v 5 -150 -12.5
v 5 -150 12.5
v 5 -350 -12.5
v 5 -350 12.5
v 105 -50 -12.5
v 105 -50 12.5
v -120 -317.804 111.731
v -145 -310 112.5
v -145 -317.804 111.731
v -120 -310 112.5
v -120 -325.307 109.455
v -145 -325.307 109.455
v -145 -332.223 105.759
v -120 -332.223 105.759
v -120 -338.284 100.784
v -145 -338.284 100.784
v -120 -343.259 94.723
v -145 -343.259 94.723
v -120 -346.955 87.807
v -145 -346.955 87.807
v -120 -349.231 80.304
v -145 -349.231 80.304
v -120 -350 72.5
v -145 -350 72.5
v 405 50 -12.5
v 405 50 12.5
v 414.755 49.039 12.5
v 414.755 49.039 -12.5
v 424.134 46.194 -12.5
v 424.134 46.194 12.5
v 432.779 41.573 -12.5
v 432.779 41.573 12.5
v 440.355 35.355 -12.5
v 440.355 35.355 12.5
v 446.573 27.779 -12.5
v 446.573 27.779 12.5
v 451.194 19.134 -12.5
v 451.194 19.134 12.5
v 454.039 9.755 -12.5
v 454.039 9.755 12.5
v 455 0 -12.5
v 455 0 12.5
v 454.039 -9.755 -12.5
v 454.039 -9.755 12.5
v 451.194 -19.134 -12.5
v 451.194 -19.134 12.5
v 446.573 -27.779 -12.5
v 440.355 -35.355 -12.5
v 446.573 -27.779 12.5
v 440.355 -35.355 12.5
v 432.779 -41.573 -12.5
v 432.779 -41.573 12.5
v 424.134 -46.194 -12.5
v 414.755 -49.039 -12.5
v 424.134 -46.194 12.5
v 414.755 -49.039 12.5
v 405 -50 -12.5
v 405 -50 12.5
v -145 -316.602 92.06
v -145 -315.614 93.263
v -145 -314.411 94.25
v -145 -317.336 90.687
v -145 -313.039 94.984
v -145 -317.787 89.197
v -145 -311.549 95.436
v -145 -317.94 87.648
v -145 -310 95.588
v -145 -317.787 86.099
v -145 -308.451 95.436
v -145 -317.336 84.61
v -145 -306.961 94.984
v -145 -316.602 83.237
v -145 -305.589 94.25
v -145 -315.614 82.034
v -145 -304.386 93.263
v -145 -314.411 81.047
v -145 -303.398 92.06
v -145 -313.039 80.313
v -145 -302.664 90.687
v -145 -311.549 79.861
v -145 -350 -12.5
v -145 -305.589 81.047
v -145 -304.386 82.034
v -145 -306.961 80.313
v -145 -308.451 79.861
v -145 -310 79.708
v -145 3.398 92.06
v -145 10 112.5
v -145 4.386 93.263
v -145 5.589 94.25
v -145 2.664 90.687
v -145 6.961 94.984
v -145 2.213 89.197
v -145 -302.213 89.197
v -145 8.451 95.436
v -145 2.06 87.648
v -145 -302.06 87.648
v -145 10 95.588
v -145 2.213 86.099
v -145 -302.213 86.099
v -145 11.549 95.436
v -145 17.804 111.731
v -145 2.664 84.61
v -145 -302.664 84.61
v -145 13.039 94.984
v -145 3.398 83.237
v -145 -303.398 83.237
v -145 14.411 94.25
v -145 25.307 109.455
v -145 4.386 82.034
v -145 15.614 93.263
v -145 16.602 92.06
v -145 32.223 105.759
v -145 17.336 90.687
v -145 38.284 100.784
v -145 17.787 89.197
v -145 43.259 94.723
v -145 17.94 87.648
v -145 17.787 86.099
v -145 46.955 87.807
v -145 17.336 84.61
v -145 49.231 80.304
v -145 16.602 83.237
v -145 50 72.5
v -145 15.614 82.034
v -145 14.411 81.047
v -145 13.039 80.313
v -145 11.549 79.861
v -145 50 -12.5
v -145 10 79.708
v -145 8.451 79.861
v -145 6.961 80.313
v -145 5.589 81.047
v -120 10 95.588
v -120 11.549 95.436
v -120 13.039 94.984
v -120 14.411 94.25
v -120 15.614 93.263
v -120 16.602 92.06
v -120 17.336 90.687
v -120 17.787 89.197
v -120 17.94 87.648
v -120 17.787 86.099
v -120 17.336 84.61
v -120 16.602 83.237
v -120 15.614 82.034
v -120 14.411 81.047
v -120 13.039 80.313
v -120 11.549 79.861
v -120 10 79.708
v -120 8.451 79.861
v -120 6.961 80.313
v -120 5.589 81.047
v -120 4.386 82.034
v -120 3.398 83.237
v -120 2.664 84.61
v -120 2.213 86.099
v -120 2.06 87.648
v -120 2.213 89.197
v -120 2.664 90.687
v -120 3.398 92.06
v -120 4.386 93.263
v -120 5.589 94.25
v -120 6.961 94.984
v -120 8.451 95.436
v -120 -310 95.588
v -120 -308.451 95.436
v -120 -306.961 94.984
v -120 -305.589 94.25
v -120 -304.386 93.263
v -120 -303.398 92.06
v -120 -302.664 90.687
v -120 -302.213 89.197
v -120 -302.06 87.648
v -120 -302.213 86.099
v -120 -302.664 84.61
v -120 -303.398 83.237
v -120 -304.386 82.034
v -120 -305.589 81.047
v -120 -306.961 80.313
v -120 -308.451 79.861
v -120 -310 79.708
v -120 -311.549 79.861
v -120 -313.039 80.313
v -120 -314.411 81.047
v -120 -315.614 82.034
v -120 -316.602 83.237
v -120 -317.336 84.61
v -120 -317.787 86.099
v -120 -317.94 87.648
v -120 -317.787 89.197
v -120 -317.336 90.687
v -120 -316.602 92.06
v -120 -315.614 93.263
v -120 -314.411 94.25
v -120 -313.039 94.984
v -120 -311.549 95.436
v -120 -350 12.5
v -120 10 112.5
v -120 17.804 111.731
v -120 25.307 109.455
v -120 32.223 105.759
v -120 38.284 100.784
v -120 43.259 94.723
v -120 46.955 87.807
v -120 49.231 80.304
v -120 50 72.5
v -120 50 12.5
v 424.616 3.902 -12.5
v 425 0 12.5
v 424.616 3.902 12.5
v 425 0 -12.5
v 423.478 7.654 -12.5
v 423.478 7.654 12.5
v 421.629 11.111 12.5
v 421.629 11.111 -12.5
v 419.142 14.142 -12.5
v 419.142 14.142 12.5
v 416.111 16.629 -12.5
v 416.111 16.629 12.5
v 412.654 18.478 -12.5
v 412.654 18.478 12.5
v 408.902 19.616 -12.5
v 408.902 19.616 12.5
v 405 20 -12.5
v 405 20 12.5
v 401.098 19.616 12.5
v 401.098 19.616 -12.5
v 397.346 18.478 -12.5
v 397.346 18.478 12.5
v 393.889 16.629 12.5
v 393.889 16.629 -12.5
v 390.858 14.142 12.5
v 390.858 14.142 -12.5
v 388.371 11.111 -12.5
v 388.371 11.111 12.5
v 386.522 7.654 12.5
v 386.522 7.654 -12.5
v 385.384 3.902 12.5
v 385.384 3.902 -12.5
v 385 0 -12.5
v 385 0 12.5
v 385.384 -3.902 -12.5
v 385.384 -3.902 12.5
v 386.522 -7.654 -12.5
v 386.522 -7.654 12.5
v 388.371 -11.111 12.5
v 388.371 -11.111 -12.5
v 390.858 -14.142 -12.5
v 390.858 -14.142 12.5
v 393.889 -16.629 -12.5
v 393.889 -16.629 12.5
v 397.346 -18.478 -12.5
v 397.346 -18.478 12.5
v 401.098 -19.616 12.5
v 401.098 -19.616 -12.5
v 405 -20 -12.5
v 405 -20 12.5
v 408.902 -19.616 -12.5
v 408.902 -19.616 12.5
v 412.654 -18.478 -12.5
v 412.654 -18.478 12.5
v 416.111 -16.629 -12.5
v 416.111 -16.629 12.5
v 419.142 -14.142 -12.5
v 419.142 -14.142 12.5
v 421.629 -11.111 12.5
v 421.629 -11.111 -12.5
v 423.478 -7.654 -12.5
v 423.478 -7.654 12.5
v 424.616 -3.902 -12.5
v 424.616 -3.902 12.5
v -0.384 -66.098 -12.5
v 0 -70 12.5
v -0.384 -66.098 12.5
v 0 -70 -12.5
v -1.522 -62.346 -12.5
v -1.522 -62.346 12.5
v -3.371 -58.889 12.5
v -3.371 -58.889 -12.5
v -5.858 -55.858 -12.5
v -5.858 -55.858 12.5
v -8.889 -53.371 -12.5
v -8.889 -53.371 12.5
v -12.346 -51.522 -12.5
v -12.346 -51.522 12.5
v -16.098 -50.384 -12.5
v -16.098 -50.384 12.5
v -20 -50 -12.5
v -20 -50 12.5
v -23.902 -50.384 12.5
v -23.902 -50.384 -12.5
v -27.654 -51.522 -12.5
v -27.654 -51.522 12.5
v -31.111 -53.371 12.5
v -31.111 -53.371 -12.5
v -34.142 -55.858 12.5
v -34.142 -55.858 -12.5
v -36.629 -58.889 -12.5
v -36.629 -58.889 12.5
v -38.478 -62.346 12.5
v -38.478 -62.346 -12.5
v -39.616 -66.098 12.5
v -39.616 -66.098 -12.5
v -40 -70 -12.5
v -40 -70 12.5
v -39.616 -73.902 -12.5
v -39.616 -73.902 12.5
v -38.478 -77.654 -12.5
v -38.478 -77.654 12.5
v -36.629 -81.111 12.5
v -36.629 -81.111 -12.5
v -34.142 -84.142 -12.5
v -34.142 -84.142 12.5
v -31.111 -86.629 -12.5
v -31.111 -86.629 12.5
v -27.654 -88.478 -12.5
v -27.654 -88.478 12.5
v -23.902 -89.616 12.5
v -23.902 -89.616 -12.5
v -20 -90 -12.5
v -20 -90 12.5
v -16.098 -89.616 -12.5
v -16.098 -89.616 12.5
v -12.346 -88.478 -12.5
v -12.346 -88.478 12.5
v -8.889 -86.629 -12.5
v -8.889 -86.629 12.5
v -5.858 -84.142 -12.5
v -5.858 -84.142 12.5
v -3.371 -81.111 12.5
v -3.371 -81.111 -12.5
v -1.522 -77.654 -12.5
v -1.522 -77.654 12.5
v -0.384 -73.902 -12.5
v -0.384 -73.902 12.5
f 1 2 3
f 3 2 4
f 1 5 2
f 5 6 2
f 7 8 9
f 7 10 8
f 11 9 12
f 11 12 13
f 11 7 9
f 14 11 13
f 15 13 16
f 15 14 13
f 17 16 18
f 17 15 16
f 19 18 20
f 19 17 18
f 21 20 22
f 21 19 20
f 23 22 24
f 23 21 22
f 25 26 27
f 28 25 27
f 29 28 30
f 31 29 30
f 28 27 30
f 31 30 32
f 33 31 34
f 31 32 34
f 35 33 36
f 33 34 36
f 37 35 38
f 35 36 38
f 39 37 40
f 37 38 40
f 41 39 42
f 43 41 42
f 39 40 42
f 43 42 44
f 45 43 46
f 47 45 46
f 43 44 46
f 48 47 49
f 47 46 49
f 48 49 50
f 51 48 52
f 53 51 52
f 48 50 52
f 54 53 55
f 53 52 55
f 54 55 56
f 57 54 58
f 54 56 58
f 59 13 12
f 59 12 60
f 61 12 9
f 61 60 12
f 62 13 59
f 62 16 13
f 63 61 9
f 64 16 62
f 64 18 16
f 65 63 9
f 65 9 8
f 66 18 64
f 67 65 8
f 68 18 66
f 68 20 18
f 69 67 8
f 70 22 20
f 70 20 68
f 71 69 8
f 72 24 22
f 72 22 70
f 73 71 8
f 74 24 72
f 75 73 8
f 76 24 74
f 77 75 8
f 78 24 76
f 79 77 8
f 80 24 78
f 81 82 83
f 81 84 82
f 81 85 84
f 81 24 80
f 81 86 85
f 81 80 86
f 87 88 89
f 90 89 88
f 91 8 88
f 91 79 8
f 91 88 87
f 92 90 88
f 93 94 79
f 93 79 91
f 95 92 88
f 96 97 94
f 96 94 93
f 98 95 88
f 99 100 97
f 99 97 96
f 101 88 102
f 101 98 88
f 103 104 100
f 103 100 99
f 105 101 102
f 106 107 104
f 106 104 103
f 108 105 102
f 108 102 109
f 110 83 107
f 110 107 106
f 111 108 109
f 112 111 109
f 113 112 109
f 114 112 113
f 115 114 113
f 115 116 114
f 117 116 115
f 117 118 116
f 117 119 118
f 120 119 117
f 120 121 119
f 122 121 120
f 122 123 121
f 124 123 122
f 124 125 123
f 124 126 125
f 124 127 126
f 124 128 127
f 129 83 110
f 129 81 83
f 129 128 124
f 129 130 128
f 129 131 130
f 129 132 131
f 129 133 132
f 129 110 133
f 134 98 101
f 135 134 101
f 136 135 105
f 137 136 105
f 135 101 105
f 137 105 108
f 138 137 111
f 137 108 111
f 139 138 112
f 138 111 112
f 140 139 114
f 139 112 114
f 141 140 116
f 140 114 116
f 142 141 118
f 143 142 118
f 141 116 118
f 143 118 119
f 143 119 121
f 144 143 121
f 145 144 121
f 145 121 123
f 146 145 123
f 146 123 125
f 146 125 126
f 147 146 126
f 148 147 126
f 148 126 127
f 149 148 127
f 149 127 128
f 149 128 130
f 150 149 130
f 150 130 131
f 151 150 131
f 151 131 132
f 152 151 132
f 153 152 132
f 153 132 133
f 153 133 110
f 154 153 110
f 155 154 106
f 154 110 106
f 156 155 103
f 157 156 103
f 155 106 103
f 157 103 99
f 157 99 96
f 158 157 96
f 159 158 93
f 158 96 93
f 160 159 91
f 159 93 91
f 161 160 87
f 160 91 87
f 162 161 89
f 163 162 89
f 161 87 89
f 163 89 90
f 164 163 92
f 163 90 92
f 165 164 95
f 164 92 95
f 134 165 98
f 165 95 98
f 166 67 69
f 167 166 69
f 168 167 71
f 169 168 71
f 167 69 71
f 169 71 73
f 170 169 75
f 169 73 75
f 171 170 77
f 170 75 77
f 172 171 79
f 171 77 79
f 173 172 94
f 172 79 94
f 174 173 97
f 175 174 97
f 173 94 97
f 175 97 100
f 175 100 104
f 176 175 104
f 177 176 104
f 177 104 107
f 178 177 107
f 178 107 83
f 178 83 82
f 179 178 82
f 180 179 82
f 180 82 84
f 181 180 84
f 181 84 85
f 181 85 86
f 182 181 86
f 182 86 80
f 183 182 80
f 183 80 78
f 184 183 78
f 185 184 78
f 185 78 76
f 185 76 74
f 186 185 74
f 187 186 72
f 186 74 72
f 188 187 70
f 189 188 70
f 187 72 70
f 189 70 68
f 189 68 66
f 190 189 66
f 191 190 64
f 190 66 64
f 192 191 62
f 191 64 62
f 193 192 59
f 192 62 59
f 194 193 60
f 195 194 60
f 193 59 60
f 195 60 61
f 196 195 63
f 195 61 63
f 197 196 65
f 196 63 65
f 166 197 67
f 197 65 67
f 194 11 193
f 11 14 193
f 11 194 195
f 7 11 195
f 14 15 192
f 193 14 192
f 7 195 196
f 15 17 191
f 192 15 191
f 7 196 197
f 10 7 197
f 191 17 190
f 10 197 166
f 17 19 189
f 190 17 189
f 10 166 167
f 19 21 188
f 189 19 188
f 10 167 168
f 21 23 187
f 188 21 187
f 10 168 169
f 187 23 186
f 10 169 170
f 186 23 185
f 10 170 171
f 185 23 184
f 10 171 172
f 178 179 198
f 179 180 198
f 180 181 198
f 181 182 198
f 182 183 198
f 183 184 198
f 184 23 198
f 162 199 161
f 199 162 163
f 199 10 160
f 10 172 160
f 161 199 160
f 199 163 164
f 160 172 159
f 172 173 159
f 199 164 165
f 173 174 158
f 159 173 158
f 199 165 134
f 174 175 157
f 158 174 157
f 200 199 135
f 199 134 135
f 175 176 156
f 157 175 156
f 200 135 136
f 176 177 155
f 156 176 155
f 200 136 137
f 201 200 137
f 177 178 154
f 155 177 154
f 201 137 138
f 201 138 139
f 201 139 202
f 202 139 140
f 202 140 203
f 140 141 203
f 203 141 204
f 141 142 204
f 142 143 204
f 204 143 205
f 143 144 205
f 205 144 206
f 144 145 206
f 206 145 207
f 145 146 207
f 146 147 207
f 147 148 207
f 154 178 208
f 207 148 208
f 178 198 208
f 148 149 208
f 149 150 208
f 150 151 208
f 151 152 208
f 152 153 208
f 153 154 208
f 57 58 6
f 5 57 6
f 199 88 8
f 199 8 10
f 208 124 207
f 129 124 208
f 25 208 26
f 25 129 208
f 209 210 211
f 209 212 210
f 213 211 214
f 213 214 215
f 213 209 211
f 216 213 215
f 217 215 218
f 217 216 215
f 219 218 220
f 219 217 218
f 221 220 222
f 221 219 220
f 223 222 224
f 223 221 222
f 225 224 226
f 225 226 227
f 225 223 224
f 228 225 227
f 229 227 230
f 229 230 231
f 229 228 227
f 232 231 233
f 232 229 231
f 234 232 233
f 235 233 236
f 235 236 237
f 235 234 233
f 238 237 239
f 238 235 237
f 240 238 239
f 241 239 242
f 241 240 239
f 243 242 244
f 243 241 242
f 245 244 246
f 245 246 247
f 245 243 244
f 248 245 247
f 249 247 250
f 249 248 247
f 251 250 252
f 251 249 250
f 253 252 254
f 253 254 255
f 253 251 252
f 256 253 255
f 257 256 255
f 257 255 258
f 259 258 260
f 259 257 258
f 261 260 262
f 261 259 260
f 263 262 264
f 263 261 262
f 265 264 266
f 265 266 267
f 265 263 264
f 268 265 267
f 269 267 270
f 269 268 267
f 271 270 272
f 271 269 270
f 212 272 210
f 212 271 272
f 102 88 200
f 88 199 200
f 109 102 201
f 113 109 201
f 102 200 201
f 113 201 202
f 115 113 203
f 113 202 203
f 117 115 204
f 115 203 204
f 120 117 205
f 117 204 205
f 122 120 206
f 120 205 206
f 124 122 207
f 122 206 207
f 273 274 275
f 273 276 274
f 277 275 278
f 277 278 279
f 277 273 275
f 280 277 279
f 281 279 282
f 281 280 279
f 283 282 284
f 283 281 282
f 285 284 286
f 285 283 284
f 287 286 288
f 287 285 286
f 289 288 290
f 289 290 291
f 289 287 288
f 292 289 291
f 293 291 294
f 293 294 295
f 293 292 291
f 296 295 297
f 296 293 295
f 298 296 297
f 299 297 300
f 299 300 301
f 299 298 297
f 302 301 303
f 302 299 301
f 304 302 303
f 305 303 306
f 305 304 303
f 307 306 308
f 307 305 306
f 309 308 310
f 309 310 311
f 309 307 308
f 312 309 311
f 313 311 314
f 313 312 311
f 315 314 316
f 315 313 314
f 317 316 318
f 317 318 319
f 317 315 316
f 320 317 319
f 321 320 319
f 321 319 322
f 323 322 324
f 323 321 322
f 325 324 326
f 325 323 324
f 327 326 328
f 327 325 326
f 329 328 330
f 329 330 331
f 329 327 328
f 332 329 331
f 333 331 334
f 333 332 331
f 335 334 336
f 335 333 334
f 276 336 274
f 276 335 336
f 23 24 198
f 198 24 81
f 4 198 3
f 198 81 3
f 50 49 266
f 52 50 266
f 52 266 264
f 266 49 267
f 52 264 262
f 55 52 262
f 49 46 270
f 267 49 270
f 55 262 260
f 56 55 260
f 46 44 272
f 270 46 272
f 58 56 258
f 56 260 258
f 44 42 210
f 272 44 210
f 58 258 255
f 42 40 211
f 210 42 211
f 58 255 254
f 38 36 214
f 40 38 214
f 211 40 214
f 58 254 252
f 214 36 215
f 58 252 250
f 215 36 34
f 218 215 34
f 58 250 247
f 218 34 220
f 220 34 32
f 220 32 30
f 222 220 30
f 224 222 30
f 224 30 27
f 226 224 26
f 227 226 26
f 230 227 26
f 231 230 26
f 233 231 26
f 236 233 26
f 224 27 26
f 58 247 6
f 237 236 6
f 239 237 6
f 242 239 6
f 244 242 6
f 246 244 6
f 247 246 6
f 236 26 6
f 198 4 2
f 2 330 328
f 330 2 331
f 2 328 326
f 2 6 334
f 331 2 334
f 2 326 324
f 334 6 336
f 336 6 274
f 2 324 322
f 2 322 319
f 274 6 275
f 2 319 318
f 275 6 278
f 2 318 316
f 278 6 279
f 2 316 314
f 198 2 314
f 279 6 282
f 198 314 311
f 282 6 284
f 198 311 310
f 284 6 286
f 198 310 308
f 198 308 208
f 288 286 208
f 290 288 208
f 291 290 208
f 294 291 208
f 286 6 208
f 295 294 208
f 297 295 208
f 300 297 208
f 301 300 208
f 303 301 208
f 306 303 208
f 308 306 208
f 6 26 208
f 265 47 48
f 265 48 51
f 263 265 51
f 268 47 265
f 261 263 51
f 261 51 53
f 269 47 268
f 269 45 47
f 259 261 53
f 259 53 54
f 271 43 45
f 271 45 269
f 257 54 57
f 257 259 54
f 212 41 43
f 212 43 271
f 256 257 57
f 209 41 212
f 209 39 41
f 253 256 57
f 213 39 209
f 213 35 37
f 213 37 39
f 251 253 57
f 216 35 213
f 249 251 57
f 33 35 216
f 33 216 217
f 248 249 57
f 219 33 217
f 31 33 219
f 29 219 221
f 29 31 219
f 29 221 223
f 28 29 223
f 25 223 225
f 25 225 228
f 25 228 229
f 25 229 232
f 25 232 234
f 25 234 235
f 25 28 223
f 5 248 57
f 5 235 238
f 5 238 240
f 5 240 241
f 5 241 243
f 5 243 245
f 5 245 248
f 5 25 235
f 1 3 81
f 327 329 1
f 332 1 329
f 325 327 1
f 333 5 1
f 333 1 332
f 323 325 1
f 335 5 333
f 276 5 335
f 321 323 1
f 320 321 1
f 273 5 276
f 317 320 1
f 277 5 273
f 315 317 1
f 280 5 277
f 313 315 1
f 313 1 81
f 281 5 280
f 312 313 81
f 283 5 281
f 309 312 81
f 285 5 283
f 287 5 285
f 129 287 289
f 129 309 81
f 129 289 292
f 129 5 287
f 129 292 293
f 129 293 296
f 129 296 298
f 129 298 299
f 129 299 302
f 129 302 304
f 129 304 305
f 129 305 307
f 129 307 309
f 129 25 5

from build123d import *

# Parameters (mm, degrees)
SKETCH1_R           = 20
BOSS_EXTRUDE1_DEPTH = 12.5
SKETCH2_W           = 25
SKETCH2_H           = 400
BOSS_EXTRUDE2_DEPTH = 100
CUT_EXTRUDE1_REACH  = 705.673
SKETCH3_R           = 7.94
FILLET1_R           = 40


with BuildPart() as part:
    # Sketch1 → Boss-Extrude1 (new, symmetric)
    with BuildSketch(Plane.XY):
        with BuildLine():
            Line((405, -50), (105, -50))
            Line((105, -50), (5, -150))
            Line((5, -150), (5, -350))
            Line((5, -350), (-145, -350))
            Line((-145, -350), (-145, 50))
            Line((-145, 50), (405, 50))
            ThreePointArc((405, 50), (455, 0), (405, -50))
        make_face()
        with Locations((405, 0)):
            Circle(SKETCH1_R, mode=Mode.SUBTRACT)
        with Locations((-20, -70)):
            Circle(SKETCH1_R, mode=Mode.SUBTRACT)
    extrude(amount=BOSS_EXTRUDE1_DEPTH, both=True)

    # Sketch2 → Boss-Extrude2 (add)
    with BuildSketch(Plane.XY.offset(12.5)):
        with Locations((-132.5, -150)):
            Rectangle(SKETCH2_W, SKETCH2_H)
    extrude(amount=BOSS_EXTRUDE2_DEPTH)

    # Sketch3 → Cut-Extrude1 (cut, up to next)
    with BuildSketch(Plane.ZY.offset(145), mode=Mode.PRIVATE) as cut_extrude1_sk1:
        with Locations((87.648409676, 10)):
            Circle(SKETCH3_R)
    cut_extrude1_tool1 = extrude(cut_extrude1_sk1.sketch, amount=-CUT_EXTRUDE1_REACH, mode=Mode.PRIVATE) & part.part
    # Sketch3 → Cut-Extrude1 (cut, up to next)
    with BuildSketch(Plane.ZY.offset(145), mode=Mode.PRIVATE) as cut_extrude1_sk2:
        with Locations((87.648409676, -310)):
            Circle(SKETCH3_R)
    cut_extrude1_tool2 = extrude(cut_extrude1_sk2.sketch, amount=-CUT_EXTRUDE1_REACH, mode=Mode.PRIVATE) & part.part
    add(cut_extrude1_tool1.solids().sort_by_distance((-145, 10, 87.64841))[0], mode=Mode.SUBTRACT)
    add(cut_extrude1_tool2.solids().sort_by_distance((-145, -310, 87.64841))[0], mode=Mode.SUBTRACT)

    # Fillet1
    fillet1_edges = [part.edges().sort_by_distance(p)[0] for p in [
        (-132.5, -350, 112.5),
        (-132.5, 50, 112.5),
    ]]
    fillet(fillet1_edges, radius=FILLET1_R)


solid = part.part
